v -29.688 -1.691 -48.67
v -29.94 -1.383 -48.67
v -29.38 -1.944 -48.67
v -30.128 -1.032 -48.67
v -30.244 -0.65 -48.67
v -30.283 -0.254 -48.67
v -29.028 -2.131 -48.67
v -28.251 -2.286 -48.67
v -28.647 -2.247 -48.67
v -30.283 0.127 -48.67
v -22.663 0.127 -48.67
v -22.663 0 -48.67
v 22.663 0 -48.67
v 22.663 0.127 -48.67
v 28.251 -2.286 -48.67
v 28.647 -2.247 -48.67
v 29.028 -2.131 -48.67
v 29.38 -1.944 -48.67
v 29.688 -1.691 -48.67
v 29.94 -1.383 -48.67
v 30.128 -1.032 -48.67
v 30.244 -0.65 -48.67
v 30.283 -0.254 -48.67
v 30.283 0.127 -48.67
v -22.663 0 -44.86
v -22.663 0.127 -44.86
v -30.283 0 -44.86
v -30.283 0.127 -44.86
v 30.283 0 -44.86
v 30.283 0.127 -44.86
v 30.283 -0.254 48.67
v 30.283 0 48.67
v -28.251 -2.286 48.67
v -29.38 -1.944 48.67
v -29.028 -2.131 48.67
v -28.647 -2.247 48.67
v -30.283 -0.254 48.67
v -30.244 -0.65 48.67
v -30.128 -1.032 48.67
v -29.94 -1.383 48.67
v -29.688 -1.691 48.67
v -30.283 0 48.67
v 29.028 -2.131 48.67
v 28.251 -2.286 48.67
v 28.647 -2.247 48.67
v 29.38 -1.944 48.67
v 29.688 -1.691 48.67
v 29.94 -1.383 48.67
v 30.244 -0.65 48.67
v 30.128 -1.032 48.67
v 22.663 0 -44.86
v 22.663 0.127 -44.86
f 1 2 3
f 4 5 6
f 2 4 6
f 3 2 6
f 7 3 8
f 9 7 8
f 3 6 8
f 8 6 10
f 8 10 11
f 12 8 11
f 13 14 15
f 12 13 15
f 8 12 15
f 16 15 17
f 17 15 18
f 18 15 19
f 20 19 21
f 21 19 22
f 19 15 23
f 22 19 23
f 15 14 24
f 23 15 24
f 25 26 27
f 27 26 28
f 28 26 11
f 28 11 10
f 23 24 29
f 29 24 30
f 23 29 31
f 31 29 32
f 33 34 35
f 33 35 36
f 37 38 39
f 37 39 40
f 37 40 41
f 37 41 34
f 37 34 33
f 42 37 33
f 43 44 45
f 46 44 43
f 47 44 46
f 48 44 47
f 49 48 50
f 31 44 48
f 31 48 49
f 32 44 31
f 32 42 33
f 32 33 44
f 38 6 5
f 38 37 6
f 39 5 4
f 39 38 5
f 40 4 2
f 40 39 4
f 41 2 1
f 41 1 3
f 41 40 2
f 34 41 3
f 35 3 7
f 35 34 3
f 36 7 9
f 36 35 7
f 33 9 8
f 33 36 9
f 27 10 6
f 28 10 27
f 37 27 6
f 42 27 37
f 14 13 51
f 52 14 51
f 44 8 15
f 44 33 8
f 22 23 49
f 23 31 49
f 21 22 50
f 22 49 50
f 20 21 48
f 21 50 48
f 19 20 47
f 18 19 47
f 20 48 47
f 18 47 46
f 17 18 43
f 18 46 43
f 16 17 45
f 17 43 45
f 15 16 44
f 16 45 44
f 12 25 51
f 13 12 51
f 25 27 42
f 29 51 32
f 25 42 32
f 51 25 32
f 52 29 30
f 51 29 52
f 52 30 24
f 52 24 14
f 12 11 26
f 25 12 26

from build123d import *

# Parameters (mm, degrees)
F0_W     = 60.565564
F0_H     = 97.339354
F1_DEPTH = 2.286
F2_R     = 2.032
F3_W     = 7.62
F3_H     = 3.81
F4_DEPTH = 0.127


with BuildPart() as f1:
    # F0 (on Front) → F1 (new body)
    with BuildSketch(Plane.XZ):
        Rectangle(F0_W, F0_H)
    extrude(amount=F1_DEPTH)

    # F2
    f2_edges = [f1.edges().sort_by_distance(p)[0] for p in [
        (30.282782, -2.286, 0),
        (-30.282782, -2.286, 0),
    ]]
    fillet(f2_edges, radius=F2_R)

    # F3 (on face) → F4 (join, symmetric)
    with BuildSketch(Plane(origin=(0, 0, 0), x_dir=(-1, 0, 0), z_dir=(0, 1, 0))):
        with Locations((-26.472782, -46.764677)):
            Rectangle(F3_W, F3_H)
        with Locations((26.472782, -46.764677)):
            Rectangle(F3_W, F3_H)
    extrude(amount=F4_DEPTH, both=True)


solid = f1.part
